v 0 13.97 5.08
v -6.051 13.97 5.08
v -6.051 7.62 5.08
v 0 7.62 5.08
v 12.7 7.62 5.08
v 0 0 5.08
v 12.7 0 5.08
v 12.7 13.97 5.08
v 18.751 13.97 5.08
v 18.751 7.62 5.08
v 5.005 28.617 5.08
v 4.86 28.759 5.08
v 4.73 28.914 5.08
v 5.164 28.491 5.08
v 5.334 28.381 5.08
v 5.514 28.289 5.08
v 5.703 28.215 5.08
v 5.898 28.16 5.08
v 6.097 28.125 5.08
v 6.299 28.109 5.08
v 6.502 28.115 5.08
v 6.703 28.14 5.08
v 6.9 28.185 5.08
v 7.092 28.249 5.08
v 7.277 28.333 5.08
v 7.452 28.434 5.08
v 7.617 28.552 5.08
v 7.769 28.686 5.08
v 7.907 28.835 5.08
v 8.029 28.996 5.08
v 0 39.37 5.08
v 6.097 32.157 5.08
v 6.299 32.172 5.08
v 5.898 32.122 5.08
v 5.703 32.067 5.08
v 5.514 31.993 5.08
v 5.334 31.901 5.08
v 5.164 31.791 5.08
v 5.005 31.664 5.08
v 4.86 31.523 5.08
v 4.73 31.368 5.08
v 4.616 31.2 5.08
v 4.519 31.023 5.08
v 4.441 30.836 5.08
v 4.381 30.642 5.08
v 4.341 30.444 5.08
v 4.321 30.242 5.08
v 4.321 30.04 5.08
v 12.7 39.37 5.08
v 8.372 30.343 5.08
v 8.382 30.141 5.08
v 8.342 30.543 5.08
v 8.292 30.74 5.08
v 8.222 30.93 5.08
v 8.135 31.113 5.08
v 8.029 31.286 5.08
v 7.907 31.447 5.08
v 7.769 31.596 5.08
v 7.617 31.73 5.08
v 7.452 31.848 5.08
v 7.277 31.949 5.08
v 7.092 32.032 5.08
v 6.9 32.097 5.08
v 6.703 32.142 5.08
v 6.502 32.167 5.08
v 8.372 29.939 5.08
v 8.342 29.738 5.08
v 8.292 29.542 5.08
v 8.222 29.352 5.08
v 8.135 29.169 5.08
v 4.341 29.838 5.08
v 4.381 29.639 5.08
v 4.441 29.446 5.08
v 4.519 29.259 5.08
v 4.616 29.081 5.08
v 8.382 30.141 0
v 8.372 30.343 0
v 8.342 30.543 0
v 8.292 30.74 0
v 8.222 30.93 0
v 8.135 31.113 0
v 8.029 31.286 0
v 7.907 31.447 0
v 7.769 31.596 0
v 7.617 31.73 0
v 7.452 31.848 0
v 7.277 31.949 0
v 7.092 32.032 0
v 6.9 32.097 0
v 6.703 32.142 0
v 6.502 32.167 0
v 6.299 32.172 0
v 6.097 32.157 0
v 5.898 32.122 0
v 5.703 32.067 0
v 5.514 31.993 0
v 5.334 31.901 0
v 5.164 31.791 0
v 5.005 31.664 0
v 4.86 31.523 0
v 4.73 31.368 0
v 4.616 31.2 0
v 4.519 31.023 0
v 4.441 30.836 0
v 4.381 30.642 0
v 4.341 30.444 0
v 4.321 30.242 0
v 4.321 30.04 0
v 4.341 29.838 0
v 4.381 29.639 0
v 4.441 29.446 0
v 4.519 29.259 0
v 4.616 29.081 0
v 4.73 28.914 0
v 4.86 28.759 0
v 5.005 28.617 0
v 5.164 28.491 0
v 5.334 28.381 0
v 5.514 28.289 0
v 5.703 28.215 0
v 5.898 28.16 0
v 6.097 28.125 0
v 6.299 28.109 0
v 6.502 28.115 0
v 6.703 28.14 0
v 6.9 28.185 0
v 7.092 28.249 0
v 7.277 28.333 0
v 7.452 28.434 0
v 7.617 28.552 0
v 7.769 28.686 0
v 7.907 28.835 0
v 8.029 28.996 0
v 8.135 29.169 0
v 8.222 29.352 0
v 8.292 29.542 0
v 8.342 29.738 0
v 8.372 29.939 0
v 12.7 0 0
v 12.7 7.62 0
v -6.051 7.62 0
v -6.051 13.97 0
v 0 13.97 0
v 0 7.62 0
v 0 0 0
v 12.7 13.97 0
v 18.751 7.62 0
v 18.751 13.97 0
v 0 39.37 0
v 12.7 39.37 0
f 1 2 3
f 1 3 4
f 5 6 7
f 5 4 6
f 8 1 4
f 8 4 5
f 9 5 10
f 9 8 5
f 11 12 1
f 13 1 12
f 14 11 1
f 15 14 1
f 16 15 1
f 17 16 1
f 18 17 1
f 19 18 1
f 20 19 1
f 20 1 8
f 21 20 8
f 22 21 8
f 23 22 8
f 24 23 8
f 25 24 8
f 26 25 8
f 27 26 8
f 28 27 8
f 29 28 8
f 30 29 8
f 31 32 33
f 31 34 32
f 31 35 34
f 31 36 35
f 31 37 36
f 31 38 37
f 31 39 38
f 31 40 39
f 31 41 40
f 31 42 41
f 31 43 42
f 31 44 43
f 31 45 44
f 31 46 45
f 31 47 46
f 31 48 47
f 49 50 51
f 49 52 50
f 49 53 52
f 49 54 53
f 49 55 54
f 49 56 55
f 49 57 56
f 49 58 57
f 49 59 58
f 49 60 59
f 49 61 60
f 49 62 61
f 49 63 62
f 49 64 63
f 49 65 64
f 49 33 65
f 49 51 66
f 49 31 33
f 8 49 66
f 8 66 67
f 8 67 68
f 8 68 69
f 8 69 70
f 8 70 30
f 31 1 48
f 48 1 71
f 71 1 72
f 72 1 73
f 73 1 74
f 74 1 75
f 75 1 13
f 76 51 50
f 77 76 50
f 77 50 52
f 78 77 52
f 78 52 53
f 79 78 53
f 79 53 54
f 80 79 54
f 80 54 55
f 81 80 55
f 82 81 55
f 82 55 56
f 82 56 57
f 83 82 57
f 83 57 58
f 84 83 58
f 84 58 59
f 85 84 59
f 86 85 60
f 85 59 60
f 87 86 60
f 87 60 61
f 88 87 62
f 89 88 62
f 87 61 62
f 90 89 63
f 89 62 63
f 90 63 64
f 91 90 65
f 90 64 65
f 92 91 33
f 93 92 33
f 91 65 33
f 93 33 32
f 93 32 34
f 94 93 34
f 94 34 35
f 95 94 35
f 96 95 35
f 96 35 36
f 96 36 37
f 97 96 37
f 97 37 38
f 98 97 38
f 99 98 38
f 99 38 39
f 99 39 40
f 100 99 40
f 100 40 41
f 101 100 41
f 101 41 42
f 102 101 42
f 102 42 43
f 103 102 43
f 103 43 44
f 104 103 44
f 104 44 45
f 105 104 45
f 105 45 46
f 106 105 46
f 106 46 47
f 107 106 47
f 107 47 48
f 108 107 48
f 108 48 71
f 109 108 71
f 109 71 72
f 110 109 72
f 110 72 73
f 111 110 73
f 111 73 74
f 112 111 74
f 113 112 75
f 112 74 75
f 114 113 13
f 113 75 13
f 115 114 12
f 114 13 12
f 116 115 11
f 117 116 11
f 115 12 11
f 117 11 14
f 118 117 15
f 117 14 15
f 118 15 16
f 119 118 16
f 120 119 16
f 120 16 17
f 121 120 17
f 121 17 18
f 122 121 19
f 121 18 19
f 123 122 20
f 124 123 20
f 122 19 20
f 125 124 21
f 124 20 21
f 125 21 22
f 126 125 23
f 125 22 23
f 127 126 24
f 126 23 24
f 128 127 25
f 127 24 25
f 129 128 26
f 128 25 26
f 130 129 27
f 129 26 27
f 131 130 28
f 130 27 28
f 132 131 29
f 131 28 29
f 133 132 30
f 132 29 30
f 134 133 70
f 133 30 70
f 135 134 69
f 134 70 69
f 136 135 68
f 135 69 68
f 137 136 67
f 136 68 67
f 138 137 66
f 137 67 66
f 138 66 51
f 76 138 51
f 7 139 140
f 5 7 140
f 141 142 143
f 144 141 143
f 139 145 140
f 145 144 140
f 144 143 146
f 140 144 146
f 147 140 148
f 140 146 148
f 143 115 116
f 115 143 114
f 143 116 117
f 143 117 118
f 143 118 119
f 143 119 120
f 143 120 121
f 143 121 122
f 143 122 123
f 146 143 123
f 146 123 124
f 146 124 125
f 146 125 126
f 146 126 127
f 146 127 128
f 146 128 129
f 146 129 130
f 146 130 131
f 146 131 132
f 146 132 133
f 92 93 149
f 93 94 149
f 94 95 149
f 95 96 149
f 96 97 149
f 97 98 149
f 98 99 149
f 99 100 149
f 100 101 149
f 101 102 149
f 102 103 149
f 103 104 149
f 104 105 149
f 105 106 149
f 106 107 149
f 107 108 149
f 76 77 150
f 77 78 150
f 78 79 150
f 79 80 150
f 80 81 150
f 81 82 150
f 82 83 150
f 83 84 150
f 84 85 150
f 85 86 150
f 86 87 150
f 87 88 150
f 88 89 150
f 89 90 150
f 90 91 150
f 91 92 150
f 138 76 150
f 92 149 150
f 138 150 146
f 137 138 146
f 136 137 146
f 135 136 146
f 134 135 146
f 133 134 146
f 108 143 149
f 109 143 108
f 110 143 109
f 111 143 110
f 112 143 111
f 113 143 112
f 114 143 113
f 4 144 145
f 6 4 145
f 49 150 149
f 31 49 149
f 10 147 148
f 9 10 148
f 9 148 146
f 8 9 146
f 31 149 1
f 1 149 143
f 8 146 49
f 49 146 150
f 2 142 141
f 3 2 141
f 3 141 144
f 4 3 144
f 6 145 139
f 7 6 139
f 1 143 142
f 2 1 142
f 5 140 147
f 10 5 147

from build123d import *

# Parameters (mm, degrees)
BOSS_EXTRUDE1_DEPTH = 5.08
SKETCH2_R           = 2.032
CUT_EXTRUDE1_DEPTH  = 7.62


with BuildPart() as part:
    # Sketch1 → Boss-Extrude1 (new body)
    with BuildSketch(Plane.XY):
        Polygon((0, 0), (12.7, 0), (12.7, 7.62), (18.751410658, 7.62), (18.751410658, 13.97), (12.7, 13.97), (12.7, 39.37), (0, 39.37), (0, 13.97), (-6.051410658, 13.97), (-6.051410658, 7.62), (0, 7.62), align=None)
    extrude(amount=BOSS_EXTRUDE1_DEPTH)

    # Sketch2 → Cut-Extrude1 (cut)
    with BuildSketch(Plane.XY.offset(5.08)):
        with Locations((6.35, 30.140865425)):
            Circle(SKETCH2_R)
    extrude(amount=-CUT_EXTRUDE1_DEPTH, mode=Mode.SUBTRACT)


solid = part.part
